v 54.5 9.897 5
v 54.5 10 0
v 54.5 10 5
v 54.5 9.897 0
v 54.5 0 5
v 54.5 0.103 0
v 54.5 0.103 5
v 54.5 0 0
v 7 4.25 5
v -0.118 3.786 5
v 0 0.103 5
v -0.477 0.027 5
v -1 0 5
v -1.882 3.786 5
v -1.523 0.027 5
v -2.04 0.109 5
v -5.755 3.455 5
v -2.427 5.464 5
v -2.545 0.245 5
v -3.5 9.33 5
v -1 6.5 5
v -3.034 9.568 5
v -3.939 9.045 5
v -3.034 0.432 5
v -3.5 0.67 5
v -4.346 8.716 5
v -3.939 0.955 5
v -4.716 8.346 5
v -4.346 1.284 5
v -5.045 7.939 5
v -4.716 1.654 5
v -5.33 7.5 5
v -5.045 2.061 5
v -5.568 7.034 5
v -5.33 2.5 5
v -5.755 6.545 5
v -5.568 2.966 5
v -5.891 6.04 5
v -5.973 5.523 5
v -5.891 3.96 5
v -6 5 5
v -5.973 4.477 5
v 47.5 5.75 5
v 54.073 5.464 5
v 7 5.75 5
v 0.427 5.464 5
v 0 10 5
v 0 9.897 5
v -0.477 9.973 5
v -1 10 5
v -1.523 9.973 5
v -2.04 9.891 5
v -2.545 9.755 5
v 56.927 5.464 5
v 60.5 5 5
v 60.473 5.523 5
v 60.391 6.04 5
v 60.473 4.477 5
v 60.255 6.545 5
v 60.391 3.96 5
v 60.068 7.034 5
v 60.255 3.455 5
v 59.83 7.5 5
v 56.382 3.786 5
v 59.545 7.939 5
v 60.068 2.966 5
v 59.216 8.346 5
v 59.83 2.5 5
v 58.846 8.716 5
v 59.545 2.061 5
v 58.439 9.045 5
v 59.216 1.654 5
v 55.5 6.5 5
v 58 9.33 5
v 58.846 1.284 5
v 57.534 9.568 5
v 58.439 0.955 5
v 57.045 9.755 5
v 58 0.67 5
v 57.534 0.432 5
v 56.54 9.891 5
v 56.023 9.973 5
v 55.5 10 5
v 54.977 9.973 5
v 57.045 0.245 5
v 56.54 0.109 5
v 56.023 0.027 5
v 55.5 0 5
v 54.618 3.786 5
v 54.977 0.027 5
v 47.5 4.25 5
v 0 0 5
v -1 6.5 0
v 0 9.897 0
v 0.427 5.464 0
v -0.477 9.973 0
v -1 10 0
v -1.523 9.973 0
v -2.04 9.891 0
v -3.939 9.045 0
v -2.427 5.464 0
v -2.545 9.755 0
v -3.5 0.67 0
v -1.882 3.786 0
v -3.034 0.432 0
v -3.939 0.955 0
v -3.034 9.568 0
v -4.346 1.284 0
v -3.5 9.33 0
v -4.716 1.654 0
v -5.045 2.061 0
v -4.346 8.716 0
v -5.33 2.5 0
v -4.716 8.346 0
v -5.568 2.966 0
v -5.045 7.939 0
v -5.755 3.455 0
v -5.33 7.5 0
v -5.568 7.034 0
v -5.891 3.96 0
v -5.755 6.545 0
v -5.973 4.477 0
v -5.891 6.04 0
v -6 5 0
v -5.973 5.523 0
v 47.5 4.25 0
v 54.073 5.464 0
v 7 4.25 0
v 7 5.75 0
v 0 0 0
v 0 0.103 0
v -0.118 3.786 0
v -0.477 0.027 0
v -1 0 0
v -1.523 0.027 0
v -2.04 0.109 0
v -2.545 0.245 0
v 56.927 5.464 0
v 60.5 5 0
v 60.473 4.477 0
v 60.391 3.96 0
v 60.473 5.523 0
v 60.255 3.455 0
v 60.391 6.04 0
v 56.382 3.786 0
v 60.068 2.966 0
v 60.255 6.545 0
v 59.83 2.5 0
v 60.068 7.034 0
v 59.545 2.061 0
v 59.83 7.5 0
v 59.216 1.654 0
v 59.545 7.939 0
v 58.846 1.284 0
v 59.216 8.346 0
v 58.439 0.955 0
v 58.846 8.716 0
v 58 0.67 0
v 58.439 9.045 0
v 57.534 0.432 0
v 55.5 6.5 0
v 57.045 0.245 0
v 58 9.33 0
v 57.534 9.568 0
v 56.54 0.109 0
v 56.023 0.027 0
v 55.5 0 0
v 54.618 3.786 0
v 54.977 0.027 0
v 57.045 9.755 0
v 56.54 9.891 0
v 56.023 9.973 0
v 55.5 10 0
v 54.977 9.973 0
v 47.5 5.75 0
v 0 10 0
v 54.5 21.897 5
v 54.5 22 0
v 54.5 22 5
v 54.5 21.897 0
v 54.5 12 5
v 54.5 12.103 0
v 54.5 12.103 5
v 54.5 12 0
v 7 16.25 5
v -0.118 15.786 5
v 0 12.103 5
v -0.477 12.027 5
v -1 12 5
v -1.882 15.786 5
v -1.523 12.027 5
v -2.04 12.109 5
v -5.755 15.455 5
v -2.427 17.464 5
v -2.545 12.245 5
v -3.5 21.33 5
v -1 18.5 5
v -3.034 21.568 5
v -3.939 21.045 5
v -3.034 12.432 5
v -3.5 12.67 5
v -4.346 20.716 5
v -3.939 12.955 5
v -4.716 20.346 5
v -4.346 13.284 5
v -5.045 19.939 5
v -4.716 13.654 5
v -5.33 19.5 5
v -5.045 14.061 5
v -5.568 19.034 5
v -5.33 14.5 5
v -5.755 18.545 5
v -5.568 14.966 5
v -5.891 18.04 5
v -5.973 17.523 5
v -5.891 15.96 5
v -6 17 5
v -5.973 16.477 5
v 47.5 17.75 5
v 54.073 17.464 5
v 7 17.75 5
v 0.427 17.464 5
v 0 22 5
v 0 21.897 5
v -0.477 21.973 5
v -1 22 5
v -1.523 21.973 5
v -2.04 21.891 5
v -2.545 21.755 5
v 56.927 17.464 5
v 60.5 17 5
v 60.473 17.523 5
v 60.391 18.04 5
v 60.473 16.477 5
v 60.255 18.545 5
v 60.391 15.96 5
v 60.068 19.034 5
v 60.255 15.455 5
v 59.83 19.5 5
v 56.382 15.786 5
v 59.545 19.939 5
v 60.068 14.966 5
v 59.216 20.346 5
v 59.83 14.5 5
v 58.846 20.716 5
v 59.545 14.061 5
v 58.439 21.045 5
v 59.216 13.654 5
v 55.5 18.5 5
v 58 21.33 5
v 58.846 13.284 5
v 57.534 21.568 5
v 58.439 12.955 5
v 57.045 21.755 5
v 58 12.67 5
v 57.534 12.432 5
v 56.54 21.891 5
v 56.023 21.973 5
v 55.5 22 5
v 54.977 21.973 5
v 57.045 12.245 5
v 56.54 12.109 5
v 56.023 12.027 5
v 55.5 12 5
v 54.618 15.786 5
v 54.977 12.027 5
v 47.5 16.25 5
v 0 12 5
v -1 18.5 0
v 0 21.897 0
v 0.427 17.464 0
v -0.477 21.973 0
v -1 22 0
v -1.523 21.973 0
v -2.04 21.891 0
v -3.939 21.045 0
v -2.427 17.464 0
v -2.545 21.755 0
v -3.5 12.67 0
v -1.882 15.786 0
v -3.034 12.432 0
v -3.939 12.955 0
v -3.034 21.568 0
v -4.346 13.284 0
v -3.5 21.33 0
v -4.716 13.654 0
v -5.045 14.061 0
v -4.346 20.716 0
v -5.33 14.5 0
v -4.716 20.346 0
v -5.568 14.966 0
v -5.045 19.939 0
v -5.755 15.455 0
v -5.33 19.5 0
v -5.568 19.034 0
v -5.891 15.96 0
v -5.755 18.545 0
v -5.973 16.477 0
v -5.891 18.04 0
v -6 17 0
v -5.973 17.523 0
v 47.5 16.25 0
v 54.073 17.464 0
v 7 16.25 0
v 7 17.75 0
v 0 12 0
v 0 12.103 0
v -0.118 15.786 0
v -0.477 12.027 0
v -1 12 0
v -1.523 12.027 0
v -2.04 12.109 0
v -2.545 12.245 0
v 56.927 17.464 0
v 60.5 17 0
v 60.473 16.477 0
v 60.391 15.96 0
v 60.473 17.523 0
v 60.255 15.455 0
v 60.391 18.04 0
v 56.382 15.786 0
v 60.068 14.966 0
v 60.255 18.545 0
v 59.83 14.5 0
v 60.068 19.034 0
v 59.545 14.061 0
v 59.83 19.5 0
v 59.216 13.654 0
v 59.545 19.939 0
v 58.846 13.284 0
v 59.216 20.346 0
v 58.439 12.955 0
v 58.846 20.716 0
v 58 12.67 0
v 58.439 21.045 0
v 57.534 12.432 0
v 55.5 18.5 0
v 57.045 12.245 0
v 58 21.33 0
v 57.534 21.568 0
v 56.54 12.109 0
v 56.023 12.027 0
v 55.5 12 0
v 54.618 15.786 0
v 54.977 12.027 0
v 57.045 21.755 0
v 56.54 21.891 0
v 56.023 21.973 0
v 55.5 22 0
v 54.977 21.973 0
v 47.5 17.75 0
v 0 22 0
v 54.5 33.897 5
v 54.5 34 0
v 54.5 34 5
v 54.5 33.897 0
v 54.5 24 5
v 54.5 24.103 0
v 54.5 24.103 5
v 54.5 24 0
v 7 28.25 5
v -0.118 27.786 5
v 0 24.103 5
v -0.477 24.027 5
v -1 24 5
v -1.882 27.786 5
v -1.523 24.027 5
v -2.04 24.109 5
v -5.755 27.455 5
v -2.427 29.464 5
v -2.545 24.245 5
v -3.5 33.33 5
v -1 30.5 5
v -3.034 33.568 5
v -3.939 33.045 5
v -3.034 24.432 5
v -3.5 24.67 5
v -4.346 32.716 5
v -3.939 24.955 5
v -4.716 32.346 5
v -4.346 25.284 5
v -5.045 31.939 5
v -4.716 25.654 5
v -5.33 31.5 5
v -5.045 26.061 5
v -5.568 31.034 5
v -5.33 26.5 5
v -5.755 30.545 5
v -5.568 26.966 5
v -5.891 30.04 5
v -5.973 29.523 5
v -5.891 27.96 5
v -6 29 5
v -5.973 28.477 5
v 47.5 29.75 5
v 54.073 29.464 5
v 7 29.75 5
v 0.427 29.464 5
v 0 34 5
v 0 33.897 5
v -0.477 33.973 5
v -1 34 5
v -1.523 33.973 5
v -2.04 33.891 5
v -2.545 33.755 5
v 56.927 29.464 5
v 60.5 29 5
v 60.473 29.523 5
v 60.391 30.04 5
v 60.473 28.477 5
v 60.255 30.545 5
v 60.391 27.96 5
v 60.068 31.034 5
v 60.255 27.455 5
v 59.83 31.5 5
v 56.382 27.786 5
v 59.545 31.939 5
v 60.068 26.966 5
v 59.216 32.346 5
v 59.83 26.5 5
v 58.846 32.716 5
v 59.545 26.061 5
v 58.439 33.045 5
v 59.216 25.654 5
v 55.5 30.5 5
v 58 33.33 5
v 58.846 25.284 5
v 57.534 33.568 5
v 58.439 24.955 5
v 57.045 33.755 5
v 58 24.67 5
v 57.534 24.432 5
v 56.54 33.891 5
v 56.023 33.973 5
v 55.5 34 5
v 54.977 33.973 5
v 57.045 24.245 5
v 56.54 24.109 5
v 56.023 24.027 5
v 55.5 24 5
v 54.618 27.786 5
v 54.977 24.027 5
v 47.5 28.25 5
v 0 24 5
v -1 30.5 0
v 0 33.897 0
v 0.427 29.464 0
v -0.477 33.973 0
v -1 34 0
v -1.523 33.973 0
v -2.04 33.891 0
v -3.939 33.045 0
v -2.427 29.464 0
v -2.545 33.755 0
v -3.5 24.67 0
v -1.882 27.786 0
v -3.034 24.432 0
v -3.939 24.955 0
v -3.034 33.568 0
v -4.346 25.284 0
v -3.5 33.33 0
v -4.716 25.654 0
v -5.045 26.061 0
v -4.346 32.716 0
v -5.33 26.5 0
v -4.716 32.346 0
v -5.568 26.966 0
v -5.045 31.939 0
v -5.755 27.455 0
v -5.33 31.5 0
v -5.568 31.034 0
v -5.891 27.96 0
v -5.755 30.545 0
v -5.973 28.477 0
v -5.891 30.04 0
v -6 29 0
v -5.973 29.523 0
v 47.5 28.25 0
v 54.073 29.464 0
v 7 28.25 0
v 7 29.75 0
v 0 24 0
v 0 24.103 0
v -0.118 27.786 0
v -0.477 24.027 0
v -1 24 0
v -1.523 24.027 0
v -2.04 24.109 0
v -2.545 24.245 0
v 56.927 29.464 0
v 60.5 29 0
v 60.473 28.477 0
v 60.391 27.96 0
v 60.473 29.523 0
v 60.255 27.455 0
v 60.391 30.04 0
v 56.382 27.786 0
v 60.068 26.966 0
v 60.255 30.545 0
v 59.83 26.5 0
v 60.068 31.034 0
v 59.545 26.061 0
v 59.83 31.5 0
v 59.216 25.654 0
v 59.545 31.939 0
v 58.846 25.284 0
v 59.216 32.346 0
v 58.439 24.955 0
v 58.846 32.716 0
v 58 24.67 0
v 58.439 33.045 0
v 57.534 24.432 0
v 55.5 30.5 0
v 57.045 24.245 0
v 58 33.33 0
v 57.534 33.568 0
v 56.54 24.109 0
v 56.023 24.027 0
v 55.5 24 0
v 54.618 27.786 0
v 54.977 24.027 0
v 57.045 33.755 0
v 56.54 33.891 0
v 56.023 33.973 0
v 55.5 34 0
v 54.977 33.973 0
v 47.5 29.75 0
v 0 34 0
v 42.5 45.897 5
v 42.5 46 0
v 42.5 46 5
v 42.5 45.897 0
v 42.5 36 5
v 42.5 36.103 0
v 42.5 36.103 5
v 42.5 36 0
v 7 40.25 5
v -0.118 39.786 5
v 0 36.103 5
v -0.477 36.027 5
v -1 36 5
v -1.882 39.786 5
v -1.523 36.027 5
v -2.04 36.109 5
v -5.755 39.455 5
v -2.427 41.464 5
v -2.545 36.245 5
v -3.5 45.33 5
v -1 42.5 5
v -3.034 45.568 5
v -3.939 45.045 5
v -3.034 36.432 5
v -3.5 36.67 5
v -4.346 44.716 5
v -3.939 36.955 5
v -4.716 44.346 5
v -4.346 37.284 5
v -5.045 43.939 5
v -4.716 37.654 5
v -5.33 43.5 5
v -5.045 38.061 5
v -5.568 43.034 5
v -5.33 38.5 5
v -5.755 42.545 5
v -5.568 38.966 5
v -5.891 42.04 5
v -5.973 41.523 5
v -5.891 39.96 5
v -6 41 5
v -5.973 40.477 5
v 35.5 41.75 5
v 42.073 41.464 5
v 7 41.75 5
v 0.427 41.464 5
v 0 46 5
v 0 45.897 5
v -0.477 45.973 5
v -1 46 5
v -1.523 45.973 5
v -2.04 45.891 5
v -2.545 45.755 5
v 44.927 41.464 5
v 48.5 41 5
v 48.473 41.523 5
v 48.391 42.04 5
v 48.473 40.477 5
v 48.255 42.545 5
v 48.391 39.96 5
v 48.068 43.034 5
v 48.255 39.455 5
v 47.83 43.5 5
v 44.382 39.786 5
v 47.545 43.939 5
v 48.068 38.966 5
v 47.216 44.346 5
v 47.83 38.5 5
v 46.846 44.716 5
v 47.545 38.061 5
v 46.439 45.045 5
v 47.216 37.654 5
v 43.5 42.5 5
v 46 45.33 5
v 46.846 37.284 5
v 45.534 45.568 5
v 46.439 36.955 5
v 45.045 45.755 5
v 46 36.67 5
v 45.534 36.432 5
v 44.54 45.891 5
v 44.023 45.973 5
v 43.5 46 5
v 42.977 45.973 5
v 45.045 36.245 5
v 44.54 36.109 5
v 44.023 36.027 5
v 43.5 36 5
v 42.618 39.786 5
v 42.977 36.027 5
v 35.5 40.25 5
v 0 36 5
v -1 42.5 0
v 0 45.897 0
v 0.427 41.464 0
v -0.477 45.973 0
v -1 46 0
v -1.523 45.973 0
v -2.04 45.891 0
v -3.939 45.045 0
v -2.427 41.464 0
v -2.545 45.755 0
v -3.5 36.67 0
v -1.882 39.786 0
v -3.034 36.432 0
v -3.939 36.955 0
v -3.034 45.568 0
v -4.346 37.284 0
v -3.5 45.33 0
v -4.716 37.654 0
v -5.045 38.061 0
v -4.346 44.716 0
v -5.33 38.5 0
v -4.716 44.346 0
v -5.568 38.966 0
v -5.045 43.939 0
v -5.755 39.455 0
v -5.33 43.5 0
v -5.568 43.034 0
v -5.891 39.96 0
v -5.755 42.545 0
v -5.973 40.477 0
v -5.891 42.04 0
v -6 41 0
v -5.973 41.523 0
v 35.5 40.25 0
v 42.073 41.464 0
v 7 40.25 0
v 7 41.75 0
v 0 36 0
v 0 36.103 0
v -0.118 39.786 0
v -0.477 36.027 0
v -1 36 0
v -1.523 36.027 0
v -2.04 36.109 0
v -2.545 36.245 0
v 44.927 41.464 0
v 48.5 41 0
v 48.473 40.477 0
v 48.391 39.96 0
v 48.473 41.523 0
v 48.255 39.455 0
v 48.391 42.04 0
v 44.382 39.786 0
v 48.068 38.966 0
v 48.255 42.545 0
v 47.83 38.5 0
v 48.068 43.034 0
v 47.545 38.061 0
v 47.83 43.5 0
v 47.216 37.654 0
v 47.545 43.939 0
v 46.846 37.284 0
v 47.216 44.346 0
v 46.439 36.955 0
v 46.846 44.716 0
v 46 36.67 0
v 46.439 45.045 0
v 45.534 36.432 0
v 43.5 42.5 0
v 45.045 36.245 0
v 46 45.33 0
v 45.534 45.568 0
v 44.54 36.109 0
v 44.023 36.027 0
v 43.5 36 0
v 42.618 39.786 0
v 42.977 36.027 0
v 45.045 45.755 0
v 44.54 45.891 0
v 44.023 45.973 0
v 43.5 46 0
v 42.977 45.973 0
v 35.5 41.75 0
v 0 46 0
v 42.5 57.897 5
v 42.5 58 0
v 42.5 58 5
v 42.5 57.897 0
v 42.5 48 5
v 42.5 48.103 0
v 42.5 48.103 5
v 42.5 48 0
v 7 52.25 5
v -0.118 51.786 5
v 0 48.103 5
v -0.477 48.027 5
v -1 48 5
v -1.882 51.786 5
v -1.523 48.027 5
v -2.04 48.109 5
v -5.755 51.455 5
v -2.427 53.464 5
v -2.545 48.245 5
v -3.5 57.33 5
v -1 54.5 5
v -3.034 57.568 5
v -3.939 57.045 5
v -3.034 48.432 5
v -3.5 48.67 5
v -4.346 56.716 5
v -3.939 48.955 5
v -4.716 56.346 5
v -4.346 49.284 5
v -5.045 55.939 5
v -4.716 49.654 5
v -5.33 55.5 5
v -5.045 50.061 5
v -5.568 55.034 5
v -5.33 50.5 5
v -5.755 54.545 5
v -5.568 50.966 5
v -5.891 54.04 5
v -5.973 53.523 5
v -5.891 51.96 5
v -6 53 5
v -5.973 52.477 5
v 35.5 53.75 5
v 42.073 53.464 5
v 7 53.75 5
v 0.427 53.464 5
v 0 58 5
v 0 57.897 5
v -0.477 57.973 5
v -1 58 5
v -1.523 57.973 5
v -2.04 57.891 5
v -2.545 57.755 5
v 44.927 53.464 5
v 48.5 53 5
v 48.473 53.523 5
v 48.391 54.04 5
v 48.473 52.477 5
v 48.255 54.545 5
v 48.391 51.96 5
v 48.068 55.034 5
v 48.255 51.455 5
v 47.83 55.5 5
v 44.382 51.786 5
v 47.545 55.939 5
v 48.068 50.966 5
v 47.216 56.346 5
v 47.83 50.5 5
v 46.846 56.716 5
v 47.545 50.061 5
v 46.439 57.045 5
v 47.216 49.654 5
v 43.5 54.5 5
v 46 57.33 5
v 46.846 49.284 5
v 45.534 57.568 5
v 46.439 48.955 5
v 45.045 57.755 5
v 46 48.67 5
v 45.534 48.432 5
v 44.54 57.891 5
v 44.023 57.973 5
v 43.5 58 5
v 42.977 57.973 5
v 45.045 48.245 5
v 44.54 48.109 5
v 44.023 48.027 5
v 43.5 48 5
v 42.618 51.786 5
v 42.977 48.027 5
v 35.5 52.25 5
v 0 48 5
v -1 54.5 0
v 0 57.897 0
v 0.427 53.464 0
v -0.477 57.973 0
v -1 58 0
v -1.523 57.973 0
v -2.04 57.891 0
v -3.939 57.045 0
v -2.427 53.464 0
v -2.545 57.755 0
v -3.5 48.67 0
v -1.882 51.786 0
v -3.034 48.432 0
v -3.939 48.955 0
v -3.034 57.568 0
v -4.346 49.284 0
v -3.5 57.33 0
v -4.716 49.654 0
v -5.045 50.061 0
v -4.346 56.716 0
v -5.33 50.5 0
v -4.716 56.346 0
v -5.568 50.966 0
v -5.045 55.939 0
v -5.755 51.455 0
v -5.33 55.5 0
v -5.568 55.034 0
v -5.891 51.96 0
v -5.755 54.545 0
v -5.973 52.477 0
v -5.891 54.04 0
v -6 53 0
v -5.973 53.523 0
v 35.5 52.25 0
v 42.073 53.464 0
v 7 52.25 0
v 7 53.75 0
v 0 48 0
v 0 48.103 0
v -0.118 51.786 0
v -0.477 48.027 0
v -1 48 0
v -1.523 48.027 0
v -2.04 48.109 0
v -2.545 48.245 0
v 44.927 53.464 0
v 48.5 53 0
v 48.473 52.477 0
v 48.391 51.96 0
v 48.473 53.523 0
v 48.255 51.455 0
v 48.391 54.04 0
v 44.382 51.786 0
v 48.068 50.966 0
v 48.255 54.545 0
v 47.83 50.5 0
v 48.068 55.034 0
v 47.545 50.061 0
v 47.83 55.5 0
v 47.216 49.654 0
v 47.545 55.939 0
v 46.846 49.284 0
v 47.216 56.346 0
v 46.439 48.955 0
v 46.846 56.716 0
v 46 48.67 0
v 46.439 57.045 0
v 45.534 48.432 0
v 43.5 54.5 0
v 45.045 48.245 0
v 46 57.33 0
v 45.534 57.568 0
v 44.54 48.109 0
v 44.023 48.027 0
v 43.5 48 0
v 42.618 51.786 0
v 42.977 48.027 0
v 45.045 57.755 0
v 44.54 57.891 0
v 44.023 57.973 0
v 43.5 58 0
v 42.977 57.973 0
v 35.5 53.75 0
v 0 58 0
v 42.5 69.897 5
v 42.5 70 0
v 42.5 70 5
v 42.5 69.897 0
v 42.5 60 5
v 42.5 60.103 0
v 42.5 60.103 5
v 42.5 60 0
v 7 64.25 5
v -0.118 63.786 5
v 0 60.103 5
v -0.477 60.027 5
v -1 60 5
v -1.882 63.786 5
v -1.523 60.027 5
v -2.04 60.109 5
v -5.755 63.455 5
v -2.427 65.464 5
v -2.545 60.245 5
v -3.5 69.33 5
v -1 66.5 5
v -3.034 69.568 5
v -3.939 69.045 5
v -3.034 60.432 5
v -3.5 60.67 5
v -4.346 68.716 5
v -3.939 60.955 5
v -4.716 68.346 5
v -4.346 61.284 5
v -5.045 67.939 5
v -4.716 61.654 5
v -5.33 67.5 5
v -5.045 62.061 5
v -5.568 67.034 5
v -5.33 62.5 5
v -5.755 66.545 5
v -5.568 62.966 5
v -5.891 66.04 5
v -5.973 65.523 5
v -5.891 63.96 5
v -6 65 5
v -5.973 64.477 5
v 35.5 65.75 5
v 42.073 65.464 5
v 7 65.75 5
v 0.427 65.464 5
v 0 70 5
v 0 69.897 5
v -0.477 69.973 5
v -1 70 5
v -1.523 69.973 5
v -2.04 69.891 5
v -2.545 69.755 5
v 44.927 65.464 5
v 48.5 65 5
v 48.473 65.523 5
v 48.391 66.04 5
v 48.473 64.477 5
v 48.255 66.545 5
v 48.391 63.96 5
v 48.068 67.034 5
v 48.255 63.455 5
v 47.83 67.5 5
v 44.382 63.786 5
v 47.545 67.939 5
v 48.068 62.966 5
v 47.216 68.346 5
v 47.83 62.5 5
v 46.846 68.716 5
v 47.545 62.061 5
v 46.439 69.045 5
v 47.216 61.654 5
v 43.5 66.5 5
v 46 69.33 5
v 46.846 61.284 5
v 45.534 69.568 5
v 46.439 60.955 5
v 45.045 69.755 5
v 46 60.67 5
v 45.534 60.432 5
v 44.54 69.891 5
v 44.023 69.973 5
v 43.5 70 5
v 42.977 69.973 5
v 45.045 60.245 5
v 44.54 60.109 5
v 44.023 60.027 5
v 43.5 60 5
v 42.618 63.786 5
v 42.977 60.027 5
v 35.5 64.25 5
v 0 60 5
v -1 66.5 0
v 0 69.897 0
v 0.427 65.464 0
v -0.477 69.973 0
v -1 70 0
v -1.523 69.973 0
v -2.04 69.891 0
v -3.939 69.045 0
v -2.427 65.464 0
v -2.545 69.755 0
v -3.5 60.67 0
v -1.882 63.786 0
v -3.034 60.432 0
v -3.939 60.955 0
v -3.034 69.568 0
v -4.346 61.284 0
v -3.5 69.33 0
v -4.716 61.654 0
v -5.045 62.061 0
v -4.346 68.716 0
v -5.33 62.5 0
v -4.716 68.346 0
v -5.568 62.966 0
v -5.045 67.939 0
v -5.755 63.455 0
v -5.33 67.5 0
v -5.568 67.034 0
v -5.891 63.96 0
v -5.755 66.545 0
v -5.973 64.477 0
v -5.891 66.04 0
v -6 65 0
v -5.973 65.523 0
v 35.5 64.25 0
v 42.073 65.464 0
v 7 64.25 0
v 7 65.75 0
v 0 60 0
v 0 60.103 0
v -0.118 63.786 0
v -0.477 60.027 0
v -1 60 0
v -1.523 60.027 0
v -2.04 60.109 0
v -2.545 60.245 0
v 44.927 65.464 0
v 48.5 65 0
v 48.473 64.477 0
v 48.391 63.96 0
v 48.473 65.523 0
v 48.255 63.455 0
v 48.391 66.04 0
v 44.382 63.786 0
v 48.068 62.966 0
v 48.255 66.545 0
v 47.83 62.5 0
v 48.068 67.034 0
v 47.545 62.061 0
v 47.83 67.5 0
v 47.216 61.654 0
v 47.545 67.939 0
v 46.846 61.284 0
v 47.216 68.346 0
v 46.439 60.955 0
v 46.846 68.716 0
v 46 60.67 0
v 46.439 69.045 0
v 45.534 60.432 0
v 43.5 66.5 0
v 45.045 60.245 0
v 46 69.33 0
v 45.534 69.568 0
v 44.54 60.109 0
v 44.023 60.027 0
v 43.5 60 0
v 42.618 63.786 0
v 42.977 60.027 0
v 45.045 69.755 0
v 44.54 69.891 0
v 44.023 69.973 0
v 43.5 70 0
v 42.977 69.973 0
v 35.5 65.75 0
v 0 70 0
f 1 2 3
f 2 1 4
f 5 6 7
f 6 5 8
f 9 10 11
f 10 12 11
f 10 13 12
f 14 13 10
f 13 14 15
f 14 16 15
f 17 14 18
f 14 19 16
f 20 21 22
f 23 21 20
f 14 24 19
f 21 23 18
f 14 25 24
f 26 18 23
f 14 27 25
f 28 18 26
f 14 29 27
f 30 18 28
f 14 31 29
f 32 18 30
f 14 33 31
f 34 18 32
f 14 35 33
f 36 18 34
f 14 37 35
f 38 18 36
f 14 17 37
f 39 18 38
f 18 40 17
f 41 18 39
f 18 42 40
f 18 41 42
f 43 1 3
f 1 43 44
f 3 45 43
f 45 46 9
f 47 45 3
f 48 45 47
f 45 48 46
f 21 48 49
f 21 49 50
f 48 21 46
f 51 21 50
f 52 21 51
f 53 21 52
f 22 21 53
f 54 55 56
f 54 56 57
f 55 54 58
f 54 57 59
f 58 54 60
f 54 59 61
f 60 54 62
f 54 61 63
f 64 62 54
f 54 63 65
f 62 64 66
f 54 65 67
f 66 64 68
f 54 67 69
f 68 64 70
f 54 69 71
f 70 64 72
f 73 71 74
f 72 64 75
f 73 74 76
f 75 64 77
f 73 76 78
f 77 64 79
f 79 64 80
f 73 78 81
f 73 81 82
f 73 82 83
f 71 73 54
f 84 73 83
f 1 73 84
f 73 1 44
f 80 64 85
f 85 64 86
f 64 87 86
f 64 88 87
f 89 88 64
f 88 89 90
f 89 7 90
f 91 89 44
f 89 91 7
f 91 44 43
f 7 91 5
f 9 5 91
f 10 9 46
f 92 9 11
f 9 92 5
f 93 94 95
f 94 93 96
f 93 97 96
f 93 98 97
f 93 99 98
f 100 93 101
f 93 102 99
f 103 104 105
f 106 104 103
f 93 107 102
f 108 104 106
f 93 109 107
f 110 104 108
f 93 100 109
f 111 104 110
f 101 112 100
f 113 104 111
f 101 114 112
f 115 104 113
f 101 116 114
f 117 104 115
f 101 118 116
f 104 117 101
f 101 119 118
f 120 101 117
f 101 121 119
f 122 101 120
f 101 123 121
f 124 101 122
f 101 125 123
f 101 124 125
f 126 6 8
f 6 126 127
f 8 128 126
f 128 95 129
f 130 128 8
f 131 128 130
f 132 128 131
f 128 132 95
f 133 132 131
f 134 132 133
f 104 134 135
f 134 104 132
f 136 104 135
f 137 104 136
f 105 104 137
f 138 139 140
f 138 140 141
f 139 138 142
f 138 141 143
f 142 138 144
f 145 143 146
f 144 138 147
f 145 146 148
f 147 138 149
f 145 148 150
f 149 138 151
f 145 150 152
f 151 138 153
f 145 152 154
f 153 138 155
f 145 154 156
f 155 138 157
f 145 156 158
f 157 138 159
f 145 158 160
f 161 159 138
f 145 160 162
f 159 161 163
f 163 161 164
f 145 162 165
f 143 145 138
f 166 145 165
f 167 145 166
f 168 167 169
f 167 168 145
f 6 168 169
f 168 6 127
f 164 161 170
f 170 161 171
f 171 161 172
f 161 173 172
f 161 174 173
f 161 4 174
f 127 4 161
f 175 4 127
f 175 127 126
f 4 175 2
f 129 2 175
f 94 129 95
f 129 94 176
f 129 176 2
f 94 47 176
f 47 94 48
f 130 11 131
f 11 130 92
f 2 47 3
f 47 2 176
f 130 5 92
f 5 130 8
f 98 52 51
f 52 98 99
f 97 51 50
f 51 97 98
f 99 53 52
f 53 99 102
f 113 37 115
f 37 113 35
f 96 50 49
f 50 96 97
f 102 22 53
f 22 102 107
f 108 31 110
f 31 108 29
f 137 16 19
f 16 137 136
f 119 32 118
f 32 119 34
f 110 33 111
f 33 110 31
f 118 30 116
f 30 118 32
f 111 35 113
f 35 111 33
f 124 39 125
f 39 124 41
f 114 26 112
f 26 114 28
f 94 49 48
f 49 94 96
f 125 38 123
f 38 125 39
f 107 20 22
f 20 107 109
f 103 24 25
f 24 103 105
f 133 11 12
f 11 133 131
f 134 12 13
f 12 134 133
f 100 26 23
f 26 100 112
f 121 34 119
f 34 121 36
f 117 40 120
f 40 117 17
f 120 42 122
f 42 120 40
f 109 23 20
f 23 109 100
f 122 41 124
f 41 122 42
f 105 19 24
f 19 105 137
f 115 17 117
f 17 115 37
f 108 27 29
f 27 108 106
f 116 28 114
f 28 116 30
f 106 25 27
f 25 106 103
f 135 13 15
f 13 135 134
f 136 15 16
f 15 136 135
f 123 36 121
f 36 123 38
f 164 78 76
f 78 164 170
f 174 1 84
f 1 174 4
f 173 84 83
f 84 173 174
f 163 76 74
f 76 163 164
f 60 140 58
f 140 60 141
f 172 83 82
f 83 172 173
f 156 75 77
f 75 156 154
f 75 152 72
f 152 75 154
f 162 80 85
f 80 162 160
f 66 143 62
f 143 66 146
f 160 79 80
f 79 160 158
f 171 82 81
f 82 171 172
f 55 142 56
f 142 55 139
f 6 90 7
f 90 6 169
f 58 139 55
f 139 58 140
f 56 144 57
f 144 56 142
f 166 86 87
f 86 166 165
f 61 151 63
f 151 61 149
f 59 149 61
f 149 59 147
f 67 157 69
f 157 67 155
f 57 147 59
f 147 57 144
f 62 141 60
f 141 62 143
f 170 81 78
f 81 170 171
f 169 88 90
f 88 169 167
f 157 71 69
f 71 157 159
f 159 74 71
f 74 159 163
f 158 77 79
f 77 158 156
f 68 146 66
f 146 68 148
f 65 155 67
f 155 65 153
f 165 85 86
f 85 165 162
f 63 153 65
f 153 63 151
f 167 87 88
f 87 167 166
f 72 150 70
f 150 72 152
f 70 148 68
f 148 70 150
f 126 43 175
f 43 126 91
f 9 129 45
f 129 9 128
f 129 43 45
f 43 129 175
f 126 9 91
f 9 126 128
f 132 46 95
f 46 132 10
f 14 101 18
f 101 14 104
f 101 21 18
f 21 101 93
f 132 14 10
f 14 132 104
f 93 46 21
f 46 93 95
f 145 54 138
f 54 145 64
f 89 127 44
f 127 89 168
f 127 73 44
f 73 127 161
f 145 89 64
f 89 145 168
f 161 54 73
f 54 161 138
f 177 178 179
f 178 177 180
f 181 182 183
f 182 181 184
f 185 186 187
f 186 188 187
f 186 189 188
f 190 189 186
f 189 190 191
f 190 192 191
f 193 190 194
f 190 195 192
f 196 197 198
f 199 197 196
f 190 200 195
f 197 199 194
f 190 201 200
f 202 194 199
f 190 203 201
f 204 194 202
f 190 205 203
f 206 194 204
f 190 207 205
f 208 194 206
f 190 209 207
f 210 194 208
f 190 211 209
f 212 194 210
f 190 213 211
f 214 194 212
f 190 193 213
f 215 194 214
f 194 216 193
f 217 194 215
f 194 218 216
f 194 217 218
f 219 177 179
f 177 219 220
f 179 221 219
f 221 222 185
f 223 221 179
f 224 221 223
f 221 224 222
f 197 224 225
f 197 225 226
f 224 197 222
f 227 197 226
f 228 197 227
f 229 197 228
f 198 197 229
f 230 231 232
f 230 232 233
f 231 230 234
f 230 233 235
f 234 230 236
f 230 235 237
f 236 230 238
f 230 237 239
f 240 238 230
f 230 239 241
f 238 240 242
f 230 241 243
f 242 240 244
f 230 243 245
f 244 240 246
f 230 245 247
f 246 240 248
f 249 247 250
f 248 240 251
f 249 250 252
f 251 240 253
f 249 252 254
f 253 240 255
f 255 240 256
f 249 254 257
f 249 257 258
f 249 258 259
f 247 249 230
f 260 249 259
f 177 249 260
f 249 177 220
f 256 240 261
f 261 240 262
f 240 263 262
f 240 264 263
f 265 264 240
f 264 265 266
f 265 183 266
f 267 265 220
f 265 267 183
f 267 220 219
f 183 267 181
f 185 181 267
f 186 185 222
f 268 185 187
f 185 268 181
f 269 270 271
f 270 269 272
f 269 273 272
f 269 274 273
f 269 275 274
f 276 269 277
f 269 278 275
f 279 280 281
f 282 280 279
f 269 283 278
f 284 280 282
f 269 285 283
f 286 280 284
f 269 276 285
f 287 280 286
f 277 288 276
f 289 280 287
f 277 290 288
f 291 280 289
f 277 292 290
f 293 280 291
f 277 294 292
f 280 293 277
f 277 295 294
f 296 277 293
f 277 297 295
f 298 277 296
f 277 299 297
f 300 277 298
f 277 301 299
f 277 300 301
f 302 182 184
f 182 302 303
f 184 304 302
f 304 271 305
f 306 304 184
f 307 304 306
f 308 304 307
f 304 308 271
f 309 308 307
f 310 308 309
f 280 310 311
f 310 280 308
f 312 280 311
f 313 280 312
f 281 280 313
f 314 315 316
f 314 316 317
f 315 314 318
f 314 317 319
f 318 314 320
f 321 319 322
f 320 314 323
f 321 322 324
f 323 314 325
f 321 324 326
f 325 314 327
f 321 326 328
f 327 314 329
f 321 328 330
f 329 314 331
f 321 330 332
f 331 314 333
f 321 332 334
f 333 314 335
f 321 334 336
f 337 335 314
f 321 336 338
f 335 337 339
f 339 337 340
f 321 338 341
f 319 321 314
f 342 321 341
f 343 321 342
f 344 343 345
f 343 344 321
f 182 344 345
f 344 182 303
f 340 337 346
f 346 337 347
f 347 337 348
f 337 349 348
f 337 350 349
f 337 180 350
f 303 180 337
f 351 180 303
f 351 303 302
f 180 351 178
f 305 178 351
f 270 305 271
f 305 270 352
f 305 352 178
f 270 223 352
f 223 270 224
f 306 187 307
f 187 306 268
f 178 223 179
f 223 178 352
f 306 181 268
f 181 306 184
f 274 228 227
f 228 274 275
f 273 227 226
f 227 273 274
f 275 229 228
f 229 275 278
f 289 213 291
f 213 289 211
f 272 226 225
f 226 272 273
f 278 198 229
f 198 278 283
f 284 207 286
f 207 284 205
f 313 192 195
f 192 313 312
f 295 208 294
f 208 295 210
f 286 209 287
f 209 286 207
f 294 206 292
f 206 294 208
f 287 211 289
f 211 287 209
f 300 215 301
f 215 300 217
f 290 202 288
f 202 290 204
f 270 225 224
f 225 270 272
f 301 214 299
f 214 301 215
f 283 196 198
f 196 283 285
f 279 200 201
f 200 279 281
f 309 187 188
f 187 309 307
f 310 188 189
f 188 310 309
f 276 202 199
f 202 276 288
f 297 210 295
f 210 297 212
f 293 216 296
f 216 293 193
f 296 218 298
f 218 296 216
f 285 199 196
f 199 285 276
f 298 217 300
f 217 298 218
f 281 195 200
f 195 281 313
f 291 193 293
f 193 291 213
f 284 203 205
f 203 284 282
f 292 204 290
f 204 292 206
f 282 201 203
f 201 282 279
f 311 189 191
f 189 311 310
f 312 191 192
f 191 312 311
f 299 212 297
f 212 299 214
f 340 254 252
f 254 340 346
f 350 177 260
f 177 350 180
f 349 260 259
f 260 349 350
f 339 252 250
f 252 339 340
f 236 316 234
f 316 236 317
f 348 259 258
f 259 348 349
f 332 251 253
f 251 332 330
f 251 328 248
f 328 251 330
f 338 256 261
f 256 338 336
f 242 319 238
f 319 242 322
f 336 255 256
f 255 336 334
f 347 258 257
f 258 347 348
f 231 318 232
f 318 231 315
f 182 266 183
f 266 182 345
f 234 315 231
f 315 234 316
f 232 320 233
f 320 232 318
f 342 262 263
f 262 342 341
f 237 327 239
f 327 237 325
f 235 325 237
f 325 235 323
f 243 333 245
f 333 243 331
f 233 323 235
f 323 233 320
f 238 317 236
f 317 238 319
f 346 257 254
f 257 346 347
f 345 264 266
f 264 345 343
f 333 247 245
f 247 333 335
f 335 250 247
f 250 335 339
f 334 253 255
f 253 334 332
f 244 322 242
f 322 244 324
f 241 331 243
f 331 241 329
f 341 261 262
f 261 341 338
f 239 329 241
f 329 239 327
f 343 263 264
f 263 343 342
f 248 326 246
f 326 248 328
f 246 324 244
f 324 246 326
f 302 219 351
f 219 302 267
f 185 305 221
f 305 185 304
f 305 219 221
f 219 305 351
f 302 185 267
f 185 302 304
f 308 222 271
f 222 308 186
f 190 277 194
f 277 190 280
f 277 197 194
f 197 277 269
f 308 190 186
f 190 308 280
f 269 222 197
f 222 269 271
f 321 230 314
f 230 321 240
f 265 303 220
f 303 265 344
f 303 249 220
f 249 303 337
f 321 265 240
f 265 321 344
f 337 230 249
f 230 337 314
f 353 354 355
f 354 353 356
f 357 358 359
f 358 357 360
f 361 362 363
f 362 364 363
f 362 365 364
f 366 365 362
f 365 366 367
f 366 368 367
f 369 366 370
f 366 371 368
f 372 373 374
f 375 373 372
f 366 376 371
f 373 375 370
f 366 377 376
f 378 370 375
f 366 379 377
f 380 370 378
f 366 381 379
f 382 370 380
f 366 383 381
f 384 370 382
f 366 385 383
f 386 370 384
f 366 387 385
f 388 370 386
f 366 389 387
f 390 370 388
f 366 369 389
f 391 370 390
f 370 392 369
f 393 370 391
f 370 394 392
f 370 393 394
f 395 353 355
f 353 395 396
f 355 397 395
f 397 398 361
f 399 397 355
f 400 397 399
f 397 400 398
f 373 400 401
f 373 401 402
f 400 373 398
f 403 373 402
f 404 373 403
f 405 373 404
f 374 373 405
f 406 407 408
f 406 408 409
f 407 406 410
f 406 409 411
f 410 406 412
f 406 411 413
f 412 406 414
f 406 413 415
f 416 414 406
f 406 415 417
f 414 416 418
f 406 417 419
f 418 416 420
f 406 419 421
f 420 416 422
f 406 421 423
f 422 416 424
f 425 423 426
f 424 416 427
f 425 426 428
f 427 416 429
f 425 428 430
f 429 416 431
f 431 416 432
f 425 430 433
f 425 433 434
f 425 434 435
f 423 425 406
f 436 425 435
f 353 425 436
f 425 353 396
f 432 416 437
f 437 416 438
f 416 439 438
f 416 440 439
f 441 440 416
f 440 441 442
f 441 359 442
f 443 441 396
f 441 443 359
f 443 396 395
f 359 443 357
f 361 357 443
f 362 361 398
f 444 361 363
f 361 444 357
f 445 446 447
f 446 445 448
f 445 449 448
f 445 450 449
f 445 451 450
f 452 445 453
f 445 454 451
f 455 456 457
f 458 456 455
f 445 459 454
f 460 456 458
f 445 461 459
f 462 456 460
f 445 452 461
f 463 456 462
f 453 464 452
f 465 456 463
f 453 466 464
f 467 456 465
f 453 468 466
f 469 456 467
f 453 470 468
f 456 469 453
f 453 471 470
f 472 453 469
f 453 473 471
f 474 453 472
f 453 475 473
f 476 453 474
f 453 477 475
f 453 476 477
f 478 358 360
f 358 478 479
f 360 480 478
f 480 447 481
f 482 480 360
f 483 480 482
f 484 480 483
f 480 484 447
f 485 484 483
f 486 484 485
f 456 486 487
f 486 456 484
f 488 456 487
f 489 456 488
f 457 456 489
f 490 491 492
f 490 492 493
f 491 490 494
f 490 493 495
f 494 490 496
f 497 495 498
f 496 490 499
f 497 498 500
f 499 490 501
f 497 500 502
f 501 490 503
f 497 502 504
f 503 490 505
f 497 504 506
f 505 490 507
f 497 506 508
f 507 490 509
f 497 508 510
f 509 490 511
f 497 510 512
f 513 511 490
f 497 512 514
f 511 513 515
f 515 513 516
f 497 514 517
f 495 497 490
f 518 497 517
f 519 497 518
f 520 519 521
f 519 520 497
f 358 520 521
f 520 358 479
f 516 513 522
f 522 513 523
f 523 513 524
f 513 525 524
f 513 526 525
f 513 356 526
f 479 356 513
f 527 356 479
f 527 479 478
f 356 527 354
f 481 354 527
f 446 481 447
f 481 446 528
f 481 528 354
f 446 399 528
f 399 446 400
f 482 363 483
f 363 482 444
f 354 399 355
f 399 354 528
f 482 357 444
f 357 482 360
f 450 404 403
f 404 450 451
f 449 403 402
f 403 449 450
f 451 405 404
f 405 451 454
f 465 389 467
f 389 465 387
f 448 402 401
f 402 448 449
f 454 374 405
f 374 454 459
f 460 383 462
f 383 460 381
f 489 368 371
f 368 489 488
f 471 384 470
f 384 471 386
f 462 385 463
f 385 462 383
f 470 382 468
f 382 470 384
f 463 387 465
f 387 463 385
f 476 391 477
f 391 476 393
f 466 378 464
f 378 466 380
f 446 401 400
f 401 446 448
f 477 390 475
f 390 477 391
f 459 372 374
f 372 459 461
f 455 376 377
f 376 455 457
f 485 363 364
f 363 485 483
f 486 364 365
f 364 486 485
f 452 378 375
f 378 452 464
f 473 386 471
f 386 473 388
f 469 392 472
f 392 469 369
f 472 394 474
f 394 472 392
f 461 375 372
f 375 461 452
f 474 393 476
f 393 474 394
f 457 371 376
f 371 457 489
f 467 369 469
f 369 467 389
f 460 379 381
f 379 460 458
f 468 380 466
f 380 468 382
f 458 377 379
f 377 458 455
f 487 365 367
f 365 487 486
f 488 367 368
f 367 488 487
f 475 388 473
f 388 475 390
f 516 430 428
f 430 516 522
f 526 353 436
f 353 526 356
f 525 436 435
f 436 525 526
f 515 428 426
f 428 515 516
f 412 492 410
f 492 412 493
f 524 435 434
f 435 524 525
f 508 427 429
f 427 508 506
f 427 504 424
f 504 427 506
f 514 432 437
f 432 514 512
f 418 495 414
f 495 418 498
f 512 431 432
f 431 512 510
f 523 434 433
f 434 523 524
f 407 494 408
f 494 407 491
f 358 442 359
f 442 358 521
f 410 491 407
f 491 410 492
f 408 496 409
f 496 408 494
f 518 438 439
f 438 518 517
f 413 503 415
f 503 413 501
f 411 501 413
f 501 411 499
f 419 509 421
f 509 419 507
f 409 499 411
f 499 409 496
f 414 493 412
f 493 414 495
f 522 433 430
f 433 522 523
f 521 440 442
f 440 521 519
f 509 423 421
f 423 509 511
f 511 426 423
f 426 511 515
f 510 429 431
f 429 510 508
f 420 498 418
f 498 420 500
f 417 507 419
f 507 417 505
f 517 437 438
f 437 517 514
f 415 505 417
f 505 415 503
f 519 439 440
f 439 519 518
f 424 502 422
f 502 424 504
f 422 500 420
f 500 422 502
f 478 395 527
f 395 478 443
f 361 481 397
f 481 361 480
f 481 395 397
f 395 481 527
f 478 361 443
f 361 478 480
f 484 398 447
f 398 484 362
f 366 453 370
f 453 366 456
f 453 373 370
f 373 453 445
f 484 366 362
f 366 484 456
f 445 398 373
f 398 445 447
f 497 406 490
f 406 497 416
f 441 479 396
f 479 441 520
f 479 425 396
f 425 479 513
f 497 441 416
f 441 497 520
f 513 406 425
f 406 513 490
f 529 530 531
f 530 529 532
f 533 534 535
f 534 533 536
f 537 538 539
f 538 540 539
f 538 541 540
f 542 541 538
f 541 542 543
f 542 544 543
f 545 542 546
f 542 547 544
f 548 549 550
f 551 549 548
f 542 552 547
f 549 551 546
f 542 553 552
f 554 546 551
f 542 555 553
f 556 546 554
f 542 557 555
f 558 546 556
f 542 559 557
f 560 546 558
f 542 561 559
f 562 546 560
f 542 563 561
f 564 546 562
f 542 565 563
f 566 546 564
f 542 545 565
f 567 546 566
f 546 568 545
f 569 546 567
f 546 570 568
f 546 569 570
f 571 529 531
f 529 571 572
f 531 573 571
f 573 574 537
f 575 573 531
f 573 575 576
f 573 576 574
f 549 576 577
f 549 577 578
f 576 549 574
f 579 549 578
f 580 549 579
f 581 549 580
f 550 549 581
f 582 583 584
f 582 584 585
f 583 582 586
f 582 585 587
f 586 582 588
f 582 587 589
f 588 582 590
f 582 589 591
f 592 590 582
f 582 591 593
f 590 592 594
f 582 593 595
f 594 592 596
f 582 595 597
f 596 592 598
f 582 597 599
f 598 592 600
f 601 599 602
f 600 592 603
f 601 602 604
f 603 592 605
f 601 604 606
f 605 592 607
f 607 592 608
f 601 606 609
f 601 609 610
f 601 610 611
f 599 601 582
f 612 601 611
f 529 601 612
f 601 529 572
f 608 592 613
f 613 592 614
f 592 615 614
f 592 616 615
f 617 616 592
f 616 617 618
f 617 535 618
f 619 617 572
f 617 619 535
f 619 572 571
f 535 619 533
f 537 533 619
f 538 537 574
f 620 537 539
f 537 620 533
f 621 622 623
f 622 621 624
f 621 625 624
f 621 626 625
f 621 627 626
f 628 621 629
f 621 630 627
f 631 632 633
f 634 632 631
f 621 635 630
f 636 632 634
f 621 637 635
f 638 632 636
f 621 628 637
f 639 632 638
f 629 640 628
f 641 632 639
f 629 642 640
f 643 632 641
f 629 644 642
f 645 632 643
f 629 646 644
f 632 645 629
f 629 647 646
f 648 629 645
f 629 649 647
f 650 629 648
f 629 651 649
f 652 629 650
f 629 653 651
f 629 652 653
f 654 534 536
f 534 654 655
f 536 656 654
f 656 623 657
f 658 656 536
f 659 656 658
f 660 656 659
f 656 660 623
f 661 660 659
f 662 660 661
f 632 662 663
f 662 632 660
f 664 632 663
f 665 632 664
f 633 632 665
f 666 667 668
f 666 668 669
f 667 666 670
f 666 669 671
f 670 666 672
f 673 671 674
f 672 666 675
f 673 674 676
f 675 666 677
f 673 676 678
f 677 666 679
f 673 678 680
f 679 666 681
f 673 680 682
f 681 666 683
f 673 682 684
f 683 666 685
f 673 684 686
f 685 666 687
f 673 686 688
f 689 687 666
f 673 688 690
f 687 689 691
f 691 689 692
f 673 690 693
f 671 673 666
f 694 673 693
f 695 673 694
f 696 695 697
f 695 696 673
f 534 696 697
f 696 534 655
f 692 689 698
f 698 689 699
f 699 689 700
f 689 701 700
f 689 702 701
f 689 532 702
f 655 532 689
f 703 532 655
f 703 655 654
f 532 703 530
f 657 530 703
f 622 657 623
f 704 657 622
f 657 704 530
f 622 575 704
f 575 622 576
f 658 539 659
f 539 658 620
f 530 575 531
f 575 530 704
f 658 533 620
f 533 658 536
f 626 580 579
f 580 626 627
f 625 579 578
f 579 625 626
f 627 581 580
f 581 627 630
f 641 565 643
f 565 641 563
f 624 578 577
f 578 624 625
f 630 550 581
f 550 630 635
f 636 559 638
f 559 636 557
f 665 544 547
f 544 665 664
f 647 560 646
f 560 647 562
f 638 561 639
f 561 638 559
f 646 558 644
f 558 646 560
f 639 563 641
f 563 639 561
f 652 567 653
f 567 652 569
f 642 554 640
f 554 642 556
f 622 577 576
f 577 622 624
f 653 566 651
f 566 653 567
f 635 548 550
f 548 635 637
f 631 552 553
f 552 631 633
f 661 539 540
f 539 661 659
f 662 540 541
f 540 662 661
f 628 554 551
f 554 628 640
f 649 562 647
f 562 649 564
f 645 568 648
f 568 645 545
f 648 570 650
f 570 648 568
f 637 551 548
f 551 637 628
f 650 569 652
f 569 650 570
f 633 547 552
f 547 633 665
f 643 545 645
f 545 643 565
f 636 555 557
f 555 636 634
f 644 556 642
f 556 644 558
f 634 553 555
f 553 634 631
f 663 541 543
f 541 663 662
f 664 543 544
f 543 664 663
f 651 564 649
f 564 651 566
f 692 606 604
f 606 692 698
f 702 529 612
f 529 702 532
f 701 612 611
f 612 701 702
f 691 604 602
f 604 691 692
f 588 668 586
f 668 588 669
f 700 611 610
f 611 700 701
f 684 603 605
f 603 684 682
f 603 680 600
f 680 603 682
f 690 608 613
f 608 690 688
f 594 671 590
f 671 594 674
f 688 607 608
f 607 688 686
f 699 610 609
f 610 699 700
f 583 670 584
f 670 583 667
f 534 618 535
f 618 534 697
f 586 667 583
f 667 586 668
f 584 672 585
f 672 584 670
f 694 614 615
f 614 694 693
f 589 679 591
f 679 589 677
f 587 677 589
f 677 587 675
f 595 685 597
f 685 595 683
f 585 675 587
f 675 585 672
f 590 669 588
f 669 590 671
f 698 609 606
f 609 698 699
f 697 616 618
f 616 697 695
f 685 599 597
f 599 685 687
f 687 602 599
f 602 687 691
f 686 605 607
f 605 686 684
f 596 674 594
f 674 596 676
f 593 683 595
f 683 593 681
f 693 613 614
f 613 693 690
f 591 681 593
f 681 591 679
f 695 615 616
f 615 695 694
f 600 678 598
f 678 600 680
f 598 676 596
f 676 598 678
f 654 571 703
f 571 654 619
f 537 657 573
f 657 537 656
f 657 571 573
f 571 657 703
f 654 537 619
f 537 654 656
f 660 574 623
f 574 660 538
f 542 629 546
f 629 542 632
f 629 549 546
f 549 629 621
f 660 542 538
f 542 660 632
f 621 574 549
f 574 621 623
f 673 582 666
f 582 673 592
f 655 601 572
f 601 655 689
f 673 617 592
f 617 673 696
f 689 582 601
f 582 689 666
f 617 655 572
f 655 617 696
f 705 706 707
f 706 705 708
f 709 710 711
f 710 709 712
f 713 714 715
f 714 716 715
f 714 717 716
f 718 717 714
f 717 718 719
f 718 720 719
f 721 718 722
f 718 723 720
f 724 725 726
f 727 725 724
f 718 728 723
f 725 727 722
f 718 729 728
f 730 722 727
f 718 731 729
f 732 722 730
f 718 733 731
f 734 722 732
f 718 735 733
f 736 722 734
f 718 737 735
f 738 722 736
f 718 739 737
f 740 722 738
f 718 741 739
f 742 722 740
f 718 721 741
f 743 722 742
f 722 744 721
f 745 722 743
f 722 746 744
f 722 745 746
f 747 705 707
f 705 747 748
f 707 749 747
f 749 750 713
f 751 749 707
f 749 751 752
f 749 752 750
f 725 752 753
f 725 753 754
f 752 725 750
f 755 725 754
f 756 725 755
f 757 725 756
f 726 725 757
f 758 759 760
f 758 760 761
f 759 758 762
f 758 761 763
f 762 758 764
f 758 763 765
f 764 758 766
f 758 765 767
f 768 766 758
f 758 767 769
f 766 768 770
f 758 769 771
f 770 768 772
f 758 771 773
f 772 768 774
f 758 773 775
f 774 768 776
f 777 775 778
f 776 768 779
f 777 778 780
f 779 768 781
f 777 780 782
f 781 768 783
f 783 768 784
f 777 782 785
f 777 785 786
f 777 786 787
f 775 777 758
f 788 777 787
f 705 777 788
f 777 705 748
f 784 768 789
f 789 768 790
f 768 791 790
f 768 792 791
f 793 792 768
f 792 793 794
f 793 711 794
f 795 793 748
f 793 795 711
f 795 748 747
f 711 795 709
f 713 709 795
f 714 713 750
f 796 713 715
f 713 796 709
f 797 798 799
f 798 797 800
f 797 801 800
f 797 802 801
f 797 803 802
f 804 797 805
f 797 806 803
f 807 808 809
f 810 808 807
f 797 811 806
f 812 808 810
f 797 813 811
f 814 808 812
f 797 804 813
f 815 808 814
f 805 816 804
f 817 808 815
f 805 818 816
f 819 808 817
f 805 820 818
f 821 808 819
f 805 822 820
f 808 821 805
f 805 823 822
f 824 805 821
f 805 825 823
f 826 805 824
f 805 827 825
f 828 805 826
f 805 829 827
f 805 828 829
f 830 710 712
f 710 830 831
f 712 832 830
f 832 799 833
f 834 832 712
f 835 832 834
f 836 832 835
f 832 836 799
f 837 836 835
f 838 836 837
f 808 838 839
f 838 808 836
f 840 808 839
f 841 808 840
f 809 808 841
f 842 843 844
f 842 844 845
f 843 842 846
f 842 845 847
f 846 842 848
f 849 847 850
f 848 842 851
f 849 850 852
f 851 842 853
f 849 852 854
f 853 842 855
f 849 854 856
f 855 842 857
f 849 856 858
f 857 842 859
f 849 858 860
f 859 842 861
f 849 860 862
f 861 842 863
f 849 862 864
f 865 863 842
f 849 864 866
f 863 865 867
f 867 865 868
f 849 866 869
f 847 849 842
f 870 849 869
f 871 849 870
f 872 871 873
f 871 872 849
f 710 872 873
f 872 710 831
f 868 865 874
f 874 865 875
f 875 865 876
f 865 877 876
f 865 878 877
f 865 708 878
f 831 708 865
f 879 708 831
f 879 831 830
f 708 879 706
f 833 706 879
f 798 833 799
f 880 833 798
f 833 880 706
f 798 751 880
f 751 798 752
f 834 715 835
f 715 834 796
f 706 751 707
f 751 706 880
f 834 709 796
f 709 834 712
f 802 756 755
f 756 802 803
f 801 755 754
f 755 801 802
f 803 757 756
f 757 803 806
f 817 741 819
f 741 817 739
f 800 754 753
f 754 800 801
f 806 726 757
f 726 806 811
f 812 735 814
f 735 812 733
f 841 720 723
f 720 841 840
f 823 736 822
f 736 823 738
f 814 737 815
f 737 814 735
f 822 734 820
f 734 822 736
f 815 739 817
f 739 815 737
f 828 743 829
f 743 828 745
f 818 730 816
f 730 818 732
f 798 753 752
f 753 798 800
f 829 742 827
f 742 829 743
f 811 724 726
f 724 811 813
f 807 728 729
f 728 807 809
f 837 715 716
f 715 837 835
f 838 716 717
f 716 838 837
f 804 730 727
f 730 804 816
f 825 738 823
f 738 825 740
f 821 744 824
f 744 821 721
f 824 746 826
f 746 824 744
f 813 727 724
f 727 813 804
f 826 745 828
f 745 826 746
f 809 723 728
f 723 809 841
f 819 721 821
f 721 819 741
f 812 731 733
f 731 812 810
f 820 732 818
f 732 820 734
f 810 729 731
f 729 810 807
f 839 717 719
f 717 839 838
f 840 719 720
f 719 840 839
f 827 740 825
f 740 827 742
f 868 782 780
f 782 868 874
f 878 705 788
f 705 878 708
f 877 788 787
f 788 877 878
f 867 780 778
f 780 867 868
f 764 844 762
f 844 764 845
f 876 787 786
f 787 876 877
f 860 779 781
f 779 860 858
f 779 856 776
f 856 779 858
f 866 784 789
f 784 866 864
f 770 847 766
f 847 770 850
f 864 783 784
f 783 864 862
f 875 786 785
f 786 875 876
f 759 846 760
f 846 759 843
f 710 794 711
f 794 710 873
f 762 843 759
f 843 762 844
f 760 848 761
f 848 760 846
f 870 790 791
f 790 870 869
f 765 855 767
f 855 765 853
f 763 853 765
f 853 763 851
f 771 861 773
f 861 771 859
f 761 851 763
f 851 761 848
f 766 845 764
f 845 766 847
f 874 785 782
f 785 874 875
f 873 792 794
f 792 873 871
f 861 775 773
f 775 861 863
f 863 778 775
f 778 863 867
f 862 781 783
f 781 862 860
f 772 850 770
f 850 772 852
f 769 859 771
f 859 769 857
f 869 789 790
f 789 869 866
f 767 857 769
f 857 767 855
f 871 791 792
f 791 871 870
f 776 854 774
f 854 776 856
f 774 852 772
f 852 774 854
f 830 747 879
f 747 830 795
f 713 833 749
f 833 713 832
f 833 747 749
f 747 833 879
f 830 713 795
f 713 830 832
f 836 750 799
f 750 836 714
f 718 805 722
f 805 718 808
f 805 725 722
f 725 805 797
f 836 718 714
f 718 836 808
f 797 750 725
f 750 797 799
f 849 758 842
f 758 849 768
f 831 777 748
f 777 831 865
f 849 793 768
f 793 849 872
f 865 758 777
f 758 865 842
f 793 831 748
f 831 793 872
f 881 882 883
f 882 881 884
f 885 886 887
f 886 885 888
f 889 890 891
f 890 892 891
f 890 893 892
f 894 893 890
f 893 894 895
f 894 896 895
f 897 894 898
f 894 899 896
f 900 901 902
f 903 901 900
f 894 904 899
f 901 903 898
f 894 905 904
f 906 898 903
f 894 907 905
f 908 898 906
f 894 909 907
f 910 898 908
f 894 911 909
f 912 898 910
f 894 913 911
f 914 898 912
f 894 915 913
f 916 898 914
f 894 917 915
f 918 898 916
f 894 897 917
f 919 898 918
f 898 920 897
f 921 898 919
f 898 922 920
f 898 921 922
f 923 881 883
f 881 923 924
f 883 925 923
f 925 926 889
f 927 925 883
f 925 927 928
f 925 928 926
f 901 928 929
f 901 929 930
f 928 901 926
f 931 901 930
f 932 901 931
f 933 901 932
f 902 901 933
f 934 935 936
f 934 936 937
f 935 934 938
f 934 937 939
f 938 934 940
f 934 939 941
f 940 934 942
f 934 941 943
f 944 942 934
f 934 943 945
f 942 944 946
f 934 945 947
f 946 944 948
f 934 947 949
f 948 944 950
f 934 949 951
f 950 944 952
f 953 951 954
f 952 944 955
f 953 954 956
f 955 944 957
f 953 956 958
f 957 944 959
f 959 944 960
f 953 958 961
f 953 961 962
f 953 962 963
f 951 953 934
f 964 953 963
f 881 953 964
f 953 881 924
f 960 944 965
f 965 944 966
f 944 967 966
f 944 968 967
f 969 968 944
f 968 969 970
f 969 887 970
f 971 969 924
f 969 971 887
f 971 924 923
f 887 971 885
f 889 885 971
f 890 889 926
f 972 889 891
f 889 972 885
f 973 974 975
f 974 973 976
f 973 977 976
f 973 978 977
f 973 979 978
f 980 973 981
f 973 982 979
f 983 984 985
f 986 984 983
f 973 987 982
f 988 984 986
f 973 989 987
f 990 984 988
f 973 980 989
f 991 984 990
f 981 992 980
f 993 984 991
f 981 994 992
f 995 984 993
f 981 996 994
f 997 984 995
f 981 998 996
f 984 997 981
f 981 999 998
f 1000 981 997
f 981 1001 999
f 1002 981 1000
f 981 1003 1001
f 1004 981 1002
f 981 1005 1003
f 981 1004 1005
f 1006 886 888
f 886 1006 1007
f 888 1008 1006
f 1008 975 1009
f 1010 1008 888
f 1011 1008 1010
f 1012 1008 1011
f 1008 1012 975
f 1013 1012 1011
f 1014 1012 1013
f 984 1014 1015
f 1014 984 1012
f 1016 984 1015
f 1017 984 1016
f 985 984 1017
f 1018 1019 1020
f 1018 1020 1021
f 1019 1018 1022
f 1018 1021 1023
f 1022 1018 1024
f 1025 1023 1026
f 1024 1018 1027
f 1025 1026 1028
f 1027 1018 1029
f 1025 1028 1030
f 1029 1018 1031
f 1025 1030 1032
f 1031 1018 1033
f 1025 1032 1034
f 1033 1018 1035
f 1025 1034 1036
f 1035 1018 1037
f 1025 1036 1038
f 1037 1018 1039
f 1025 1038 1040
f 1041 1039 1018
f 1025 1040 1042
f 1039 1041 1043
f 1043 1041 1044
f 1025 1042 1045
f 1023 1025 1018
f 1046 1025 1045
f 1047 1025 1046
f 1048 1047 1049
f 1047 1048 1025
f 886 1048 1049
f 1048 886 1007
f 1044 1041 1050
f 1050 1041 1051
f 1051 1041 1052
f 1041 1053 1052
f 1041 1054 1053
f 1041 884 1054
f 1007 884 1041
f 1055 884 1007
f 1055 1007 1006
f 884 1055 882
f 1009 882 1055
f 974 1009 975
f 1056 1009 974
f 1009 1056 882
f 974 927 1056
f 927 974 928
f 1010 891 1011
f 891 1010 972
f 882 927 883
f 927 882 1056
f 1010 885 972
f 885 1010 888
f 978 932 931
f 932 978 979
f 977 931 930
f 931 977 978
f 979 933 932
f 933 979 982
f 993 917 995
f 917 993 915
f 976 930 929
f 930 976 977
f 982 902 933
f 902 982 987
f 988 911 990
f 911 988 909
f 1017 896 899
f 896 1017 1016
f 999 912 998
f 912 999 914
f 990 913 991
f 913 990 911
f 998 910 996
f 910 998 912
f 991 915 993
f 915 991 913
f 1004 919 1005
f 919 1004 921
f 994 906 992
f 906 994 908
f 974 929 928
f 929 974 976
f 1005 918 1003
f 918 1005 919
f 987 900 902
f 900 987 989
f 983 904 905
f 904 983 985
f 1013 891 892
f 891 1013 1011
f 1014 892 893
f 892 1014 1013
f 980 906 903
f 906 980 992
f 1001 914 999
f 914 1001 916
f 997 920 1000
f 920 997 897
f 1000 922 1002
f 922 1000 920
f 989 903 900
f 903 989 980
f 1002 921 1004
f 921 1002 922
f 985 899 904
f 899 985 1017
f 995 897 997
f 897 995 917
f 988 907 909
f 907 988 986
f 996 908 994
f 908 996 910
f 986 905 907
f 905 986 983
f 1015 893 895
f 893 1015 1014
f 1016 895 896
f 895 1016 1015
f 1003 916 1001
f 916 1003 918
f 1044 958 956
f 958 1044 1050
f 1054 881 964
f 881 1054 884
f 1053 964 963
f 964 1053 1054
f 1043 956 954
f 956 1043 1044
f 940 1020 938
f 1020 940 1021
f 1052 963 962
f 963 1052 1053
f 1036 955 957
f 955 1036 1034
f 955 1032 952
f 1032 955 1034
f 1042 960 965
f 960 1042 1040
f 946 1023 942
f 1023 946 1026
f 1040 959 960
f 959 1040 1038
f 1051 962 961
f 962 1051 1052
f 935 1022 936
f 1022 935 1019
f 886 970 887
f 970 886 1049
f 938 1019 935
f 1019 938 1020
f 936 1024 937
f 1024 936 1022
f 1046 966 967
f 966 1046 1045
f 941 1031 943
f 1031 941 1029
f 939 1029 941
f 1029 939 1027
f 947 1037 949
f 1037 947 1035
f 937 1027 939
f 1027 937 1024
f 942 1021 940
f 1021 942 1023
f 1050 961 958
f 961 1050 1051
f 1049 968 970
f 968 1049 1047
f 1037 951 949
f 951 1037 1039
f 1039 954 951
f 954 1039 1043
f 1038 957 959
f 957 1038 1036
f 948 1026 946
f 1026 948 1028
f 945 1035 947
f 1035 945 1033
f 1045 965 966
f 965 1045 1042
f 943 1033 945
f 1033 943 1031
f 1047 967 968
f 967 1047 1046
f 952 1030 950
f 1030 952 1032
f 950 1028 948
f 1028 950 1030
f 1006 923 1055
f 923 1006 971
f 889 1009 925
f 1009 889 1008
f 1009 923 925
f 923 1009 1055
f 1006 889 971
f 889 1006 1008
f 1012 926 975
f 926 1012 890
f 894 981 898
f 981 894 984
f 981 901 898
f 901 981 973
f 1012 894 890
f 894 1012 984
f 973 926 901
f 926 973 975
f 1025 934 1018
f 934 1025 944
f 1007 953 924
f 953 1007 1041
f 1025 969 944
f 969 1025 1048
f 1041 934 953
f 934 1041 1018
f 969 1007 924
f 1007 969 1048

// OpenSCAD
include <inc/rack_item.scad>

translate([0,12*0,0]) connector_lock();
translate([0,12*1,0]) connector_lock();
translate([0,12*2,0]) connector_lock();

translate([0,12*3,0]) connector_lock(bw=53+1.5-2*6);
translate([0,12*4,0]) connector_lock(bw=53+1.5-2*6);
translate([0,12*5,0]) connector_lock(bw=53+1.5-2*6);
